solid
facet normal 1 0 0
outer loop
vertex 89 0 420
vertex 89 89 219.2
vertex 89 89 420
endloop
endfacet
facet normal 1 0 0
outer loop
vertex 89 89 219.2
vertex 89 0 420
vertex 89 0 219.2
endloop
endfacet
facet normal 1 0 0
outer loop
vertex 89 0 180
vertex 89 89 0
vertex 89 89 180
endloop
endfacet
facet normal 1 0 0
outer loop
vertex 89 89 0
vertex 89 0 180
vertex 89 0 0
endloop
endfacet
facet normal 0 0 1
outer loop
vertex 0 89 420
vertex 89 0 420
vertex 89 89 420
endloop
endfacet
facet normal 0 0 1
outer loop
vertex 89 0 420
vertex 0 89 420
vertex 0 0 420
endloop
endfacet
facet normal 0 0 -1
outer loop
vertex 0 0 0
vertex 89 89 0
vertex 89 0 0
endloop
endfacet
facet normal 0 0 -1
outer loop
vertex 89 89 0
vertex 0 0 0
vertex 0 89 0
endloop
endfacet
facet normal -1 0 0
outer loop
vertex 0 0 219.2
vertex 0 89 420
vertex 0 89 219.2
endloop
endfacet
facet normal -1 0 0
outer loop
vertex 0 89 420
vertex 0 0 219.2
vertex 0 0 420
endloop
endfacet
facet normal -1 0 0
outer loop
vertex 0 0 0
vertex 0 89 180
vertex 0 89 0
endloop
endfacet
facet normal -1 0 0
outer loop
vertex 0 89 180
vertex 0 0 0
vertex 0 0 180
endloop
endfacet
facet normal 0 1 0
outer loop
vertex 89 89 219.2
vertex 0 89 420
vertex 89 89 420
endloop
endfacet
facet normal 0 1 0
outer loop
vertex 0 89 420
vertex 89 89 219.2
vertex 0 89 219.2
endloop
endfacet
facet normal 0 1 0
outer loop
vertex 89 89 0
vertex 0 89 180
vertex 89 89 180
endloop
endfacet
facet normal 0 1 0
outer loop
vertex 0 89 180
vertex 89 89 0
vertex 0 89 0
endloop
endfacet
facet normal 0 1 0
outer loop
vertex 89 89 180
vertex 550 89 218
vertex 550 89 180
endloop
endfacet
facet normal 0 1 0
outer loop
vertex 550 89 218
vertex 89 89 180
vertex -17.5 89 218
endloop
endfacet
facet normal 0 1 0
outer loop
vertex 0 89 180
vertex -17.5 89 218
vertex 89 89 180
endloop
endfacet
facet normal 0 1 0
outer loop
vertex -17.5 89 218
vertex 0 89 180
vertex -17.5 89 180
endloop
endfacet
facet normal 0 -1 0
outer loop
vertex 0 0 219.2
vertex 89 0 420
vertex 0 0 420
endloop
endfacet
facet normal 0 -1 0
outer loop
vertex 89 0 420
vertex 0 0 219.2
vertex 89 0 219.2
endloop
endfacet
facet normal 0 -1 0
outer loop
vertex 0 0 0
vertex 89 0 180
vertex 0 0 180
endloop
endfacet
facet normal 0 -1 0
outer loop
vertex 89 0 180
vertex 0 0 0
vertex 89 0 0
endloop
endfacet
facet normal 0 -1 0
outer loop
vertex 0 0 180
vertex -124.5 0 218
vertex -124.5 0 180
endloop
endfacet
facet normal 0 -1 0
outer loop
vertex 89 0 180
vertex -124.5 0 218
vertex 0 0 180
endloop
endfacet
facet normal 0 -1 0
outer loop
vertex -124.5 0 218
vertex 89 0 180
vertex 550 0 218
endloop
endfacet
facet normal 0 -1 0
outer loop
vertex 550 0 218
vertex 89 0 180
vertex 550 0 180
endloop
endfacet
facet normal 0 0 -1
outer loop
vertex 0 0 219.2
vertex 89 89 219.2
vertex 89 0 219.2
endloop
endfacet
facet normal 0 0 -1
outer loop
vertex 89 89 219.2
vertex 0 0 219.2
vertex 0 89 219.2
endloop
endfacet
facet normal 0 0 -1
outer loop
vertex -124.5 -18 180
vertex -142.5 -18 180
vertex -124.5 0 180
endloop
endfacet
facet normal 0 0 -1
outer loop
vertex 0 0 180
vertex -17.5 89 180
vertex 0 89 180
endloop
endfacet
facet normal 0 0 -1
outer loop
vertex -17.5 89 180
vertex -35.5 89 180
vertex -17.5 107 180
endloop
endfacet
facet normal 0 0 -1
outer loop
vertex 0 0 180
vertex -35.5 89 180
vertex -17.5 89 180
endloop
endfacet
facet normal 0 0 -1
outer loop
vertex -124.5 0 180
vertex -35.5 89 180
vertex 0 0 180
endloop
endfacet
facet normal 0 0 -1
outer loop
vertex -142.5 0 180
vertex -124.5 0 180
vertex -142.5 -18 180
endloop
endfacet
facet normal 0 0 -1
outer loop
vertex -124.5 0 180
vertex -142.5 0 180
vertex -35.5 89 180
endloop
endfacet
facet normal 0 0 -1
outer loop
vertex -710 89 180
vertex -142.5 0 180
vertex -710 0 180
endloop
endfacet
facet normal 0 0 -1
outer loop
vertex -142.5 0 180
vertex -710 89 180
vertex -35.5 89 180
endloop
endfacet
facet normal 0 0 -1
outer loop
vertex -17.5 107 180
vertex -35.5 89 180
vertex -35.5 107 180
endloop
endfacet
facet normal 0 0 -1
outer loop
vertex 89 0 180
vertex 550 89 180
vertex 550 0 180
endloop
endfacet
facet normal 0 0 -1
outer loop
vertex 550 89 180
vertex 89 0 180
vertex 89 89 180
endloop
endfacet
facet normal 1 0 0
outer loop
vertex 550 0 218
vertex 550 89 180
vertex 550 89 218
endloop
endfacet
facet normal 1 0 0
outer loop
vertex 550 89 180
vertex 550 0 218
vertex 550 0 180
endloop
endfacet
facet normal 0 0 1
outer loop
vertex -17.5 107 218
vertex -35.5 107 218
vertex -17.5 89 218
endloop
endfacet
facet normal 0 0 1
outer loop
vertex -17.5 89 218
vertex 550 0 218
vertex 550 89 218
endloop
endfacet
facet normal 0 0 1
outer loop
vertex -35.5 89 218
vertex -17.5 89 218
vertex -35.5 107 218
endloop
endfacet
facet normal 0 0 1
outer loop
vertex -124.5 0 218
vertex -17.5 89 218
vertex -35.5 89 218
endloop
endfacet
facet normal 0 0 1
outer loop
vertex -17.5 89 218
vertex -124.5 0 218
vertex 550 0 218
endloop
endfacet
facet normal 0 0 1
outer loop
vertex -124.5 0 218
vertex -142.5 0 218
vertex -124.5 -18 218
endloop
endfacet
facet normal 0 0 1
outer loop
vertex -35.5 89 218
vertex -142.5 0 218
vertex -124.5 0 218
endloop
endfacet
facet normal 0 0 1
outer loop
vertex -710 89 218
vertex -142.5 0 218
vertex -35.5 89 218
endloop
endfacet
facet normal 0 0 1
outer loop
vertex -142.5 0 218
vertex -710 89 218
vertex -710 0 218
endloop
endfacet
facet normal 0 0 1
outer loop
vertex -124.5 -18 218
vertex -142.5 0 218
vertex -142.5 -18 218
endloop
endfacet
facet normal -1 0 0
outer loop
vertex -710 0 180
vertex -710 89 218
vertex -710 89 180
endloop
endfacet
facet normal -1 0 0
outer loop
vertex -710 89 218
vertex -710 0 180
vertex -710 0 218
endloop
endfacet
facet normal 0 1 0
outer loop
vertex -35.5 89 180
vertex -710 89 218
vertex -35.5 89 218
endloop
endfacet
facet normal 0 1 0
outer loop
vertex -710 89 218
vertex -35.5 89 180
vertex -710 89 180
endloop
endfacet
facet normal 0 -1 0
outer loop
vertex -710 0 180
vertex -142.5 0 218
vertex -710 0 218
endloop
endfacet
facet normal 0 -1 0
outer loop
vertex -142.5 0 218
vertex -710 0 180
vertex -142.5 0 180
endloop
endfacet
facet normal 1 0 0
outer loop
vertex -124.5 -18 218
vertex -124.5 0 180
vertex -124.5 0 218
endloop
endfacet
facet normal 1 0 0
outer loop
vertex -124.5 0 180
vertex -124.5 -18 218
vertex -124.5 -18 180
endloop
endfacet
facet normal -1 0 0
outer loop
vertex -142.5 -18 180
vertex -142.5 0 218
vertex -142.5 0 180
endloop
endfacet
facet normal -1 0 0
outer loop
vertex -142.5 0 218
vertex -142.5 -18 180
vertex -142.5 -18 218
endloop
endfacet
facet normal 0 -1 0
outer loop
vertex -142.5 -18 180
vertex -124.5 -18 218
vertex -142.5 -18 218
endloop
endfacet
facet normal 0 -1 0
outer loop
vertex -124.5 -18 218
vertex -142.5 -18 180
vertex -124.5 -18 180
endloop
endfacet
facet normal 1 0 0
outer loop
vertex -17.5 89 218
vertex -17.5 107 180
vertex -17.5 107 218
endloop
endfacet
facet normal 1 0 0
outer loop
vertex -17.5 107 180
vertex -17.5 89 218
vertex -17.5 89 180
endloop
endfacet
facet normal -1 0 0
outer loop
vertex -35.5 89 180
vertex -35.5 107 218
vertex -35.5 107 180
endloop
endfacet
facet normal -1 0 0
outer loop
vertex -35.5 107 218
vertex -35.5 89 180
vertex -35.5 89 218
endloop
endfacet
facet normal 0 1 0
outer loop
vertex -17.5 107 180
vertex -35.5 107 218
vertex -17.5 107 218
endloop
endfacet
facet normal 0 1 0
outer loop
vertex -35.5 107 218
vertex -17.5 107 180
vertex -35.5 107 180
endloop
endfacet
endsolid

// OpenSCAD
// file: hashira_lib.scad
// HASHIRA — shared dimensions (mm)
// Tunable via -D on the command line / OpenSCAD MCP variables

post_w = 89;          // ~3.5" nominal 4x4
post_d = 89;
post_h = 1800;        // above-grade height shown
rail_w = 89;          // rail width (through post face)
rail_t = 38;          // rail thickness
rail_len = 1800;      // bay center-to-center approx
bay_cc = 1800;        // post center spacing
cap_overhang = 18;
cap_h = 28;

// rail elevations from post bottom (above grade in model)
rail_z_low = 200;
rail_z_mid = 900;
rail_z_top = 1500;

ease = 1.2;           // seasonal mortise ease
peg_d = 10;
wood_post = [0.55, 0.35, 0.18];
wood_rail = [0.42, 0.52, 0.34];
wood_peg  = [0.72, 0.62, 0.42];

module hashira_post(h=post_h, w=post_w, d=post_d) {
  color(wood_post) cube([w, d, h], center=false);
}

module hashira_cap(w=post_w, d=post_d, oh=cap_overhang, h=cap_h) {
  color([0.88, 0.85, 0.78])
  translate([-oh, -oh, 0])
    linear_extrude(height=h, scale=0.72)
      square([w + 2*oh, d + 2*oh], center=false);
}

module nuki_rail(len=rail_len, w=rail_w, t=rail_t) {
  color(wood_rail) cube([len, w, t], center=false);
}

module peg(h=post_d + 20, d=peg_d) {
  color(wood_peg) cylinder(h=h, d=d, $fn=24);
}
// main file
// Watari-ago 渡り顎 — passing jaw / shouldered through rail
include <hashira_lib.scad>

exploded = 1;
haunch = 18;
explode_gap = 80;

module watari_rail() {
  // main through bar with offset shoulders
  union() {
    translate([0, 0, 0]) cube([rail_len*0.7, rail_w, rail_t]);
    // front haunch
    translate([rail_len*0.35 - post_w/2 - haunch, -haunch, 0])
      cube([haunch, rail_w + haunch, rail_t]);
    // back haunch (offset)
    translate([rail_len*0.35 + post_w/2, 0, 0])
      cube([haunch, rail_w + haunch, rail_t]);
  }
}

module watari_ago_assembly() {
  difference() {
    hashira_post(h=420, w=post_w, d=post_d);
    // through mortise
    translate([-1, (post_d - rail_w)/2 - ease/2, 180])
      cube([post_w + 2, rail_w + ease, rail_t + ease]);
    // haunch seats
    translate([-1, -haunch - ease/2, 180])
      cube([haunch + 2, haunch + ease, rail_t + ease]);
    translate([post_w - haunch - 1, post_d - ease/2, 180])
      cube([haunch + 2, haunch + ease, rail_t + ease]);
  }

  translate([
    exploded ? -rail_len*0.35 - explode_gap : -rail_len*0.35,
    (post_d - rail_w)/2,
    180
  ]) color(wood_rail) watari_rail();
}

watari_ago_assembly();
